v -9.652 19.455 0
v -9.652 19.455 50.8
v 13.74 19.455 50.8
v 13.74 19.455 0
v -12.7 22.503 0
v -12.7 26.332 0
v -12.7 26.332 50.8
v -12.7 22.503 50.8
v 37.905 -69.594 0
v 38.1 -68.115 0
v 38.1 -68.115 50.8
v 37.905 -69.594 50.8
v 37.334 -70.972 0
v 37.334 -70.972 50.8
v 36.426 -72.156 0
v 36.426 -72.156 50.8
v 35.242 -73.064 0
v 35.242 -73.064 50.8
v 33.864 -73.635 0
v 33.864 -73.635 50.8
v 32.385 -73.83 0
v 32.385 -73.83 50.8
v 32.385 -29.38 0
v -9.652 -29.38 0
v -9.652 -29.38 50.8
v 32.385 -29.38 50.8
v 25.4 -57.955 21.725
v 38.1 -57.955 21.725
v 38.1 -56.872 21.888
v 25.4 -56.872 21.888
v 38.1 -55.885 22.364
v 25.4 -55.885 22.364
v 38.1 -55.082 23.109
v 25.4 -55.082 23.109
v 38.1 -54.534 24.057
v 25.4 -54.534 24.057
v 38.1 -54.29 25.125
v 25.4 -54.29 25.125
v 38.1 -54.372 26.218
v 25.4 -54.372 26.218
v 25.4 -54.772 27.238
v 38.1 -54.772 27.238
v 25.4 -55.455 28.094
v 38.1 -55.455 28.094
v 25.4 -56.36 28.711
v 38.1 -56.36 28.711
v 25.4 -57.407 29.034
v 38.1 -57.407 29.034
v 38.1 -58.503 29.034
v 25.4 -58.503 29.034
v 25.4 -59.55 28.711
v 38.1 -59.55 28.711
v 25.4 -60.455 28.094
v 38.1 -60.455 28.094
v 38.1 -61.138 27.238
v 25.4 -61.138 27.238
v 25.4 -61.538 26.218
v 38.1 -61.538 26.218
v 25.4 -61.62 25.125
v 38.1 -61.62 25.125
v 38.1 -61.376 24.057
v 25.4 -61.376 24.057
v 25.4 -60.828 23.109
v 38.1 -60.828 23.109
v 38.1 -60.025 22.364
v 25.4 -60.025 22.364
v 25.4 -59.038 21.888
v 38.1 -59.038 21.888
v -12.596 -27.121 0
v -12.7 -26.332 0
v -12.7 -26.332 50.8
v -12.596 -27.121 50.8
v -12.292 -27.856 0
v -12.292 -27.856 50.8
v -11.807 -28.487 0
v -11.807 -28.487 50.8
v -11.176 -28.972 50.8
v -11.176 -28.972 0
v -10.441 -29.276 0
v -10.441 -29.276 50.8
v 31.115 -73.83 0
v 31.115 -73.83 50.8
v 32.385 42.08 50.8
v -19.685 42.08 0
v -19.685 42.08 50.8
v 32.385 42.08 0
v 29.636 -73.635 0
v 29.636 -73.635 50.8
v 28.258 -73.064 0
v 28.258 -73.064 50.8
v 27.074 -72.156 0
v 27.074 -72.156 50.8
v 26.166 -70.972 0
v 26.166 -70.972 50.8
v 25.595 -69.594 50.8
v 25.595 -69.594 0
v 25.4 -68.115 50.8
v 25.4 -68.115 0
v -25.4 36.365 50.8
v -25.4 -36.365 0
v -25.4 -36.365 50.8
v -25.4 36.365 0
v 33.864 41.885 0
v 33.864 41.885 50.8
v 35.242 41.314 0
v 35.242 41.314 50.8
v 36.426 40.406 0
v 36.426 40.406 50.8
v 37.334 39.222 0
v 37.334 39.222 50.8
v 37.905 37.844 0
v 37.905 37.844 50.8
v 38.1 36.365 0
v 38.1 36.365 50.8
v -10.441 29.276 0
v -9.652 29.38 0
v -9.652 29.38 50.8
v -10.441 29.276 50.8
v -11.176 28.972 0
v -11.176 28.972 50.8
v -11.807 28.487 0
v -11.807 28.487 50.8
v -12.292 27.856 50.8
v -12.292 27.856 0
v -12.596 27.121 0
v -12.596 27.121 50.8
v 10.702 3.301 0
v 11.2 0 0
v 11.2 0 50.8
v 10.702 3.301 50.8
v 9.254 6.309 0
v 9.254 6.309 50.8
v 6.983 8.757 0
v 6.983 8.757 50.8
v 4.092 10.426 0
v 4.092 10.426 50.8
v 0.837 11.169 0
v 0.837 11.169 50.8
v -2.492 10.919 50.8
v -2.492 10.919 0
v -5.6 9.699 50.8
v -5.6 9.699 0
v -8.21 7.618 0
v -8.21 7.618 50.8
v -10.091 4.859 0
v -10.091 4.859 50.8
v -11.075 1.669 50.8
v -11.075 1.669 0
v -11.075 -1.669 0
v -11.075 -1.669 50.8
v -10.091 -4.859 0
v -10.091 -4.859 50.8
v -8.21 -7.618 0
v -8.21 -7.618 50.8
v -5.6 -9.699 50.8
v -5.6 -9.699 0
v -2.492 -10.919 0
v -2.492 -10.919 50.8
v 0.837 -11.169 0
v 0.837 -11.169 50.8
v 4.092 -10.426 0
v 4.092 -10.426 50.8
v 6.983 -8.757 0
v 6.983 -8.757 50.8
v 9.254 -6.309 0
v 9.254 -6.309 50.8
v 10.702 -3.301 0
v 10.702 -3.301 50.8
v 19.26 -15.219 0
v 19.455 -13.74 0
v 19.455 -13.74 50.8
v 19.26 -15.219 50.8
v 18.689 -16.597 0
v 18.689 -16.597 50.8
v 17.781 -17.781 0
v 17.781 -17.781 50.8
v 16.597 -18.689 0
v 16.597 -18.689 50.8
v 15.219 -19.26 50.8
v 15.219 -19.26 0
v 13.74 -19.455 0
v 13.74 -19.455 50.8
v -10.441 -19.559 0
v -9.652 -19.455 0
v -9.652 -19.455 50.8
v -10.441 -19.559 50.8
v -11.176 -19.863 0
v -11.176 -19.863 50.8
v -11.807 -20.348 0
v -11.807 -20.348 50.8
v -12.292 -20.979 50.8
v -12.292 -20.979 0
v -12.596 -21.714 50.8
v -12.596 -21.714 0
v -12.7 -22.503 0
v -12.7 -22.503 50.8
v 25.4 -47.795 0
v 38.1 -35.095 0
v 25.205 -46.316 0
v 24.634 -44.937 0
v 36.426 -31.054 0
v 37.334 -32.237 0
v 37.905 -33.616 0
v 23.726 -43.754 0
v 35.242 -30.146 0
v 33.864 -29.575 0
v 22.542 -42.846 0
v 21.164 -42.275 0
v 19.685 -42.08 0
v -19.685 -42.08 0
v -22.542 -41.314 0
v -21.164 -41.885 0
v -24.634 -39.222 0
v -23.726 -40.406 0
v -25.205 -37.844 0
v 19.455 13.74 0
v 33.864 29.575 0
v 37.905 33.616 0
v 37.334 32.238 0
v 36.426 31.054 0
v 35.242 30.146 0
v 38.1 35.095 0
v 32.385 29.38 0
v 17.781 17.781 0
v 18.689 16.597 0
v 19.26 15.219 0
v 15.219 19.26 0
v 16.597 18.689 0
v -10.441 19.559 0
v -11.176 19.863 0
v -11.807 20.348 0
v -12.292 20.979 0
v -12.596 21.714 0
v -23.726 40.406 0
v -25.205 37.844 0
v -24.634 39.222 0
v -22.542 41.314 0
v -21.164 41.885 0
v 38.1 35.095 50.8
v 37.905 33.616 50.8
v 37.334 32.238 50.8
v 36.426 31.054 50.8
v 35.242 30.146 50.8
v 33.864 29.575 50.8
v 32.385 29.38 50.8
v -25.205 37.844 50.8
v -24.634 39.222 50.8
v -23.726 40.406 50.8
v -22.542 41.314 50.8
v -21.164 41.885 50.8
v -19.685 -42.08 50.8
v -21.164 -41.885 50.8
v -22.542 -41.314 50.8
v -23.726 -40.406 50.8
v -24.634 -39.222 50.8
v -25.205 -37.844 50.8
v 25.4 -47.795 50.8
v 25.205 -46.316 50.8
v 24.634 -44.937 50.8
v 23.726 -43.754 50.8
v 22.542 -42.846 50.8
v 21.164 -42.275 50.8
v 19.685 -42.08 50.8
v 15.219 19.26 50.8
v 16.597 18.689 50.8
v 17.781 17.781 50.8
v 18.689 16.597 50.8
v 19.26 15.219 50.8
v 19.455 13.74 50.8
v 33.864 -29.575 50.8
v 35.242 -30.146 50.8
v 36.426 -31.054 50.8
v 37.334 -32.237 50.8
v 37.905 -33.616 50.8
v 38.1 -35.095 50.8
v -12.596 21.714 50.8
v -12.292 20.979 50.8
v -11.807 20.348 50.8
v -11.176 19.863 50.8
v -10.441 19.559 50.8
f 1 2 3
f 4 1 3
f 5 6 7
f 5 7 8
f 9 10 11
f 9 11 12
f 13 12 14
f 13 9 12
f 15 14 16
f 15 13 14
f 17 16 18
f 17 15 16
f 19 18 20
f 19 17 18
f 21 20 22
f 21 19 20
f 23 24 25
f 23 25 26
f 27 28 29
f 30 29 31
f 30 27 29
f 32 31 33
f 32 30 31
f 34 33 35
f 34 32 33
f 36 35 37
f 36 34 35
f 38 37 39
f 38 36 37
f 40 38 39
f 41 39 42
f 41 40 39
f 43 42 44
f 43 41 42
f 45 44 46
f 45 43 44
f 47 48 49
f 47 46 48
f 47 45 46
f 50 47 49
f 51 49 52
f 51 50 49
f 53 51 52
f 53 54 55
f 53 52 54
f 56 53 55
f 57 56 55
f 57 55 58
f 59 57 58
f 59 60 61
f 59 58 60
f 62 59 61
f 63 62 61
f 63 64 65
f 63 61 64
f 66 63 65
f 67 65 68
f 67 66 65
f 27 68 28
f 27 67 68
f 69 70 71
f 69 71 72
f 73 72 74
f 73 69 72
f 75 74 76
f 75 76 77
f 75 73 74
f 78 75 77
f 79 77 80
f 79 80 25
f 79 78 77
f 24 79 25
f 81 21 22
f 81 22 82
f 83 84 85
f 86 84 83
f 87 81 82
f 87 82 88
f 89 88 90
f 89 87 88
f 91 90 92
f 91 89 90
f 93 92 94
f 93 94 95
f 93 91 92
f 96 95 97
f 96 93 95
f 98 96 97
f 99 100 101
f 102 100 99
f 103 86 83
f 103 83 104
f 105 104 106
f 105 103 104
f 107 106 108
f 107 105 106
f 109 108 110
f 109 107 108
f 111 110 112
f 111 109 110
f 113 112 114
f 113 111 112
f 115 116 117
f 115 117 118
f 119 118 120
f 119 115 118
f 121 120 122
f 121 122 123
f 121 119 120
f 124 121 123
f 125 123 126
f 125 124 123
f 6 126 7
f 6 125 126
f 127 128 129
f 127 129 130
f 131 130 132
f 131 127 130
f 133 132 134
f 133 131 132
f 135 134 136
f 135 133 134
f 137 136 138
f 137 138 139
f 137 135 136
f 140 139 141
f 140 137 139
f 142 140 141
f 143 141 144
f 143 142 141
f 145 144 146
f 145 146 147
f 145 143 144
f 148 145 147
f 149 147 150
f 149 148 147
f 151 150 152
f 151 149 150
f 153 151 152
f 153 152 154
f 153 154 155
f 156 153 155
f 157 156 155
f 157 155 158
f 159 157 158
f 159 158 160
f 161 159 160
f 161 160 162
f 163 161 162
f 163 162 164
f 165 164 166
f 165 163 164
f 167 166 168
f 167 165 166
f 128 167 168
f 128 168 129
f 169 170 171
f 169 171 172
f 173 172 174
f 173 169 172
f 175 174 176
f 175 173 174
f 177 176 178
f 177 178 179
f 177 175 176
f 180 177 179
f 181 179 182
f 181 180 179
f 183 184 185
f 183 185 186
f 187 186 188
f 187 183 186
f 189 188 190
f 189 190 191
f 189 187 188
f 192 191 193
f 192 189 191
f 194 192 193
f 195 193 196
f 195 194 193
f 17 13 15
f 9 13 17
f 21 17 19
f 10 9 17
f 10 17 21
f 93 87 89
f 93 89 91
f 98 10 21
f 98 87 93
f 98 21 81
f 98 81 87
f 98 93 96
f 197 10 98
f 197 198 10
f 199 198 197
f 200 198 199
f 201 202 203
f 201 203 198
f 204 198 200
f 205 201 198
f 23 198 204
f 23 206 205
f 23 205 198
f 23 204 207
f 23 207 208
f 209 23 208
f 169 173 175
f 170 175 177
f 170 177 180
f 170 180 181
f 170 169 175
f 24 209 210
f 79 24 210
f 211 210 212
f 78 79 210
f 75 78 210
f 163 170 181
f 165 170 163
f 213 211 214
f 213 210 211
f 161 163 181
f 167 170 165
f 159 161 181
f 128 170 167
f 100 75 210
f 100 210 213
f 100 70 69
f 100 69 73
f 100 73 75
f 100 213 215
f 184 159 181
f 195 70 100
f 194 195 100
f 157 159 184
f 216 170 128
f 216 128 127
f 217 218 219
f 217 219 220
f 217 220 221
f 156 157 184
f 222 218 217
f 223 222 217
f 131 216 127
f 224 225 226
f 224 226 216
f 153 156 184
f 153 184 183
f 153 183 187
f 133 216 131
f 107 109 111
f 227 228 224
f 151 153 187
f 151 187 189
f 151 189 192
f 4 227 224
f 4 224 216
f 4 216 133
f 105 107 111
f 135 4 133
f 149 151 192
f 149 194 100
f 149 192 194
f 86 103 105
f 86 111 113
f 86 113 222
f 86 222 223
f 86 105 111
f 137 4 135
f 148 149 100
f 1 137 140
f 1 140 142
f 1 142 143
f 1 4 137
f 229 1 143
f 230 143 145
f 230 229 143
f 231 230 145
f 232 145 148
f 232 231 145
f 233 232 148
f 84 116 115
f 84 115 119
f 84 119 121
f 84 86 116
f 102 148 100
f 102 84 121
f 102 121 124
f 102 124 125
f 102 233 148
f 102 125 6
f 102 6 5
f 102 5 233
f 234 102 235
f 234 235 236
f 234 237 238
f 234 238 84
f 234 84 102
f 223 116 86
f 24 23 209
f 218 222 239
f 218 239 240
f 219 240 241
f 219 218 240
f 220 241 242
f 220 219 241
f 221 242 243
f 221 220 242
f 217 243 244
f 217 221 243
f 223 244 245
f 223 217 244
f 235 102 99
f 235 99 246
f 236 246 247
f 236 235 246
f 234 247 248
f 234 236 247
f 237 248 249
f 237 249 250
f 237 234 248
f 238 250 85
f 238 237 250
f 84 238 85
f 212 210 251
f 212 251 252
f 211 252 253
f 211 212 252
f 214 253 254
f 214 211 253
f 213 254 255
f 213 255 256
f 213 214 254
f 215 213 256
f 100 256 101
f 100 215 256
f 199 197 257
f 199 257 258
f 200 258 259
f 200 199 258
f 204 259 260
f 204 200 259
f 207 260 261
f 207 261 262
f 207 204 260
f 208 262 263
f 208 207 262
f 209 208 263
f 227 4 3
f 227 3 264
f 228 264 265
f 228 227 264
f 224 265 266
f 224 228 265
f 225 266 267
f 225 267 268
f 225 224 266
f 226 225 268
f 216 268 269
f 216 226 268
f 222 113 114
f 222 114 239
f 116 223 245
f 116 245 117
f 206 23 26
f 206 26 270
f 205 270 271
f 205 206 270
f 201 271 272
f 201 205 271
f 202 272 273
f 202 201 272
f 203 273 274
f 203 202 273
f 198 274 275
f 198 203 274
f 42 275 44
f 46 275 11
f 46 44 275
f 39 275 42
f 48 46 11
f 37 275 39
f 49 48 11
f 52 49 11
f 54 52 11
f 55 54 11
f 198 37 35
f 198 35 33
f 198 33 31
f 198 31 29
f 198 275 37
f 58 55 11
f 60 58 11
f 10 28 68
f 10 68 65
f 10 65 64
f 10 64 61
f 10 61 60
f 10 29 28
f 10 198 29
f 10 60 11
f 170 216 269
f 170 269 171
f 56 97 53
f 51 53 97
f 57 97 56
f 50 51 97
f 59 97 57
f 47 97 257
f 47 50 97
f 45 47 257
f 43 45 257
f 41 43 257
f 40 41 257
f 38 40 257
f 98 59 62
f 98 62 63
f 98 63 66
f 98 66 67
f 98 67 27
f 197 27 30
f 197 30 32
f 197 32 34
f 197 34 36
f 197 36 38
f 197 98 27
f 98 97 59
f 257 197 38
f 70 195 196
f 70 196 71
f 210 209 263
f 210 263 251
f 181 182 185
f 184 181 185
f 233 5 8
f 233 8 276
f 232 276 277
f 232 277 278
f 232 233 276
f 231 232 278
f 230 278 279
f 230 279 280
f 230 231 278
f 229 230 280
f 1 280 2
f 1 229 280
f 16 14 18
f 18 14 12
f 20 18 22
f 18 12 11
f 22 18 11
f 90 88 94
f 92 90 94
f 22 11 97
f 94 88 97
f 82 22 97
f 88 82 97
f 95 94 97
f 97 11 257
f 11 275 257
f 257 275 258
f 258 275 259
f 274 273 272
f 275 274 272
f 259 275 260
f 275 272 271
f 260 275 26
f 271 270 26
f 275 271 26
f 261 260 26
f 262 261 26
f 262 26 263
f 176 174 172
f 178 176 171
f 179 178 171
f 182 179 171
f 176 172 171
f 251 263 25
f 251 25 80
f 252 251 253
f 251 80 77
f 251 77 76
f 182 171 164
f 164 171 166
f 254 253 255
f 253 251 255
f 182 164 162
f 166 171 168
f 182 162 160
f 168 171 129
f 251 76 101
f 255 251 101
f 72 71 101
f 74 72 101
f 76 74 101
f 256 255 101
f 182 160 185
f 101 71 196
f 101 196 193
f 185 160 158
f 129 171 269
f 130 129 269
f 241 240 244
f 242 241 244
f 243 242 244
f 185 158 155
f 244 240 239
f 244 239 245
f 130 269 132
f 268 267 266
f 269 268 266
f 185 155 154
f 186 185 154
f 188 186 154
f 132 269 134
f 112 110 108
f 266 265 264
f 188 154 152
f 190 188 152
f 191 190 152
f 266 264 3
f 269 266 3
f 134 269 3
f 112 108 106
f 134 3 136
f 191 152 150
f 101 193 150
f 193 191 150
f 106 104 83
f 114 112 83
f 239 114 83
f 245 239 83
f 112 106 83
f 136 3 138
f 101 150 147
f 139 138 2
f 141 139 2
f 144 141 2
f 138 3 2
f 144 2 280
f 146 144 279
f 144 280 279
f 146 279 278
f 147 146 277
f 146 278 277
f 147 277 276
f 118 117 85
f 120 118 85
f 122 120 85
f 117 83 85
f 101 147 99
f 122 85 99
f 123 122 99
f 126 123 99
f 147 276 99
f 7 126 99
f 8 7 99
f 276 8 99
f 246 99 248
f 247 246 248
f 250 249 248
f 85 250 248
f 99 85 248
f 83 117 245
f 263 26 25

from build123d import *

# Parameters (mm, degrees)
SKETCH1_R           = 11.2
BOSS_EXTRUDE1_DEPTH = 50.8
SKETCH2_R           = 3.675
CUT_EXTRUDE1_DEPTH  = 50.8


with BuildPart() as part:
    # Sketch1 → Boss-Extrude1 (new body)
    with BuildSketch(Plane.XY):
        with BuildLine():
            Line((-25.4, -36.364999962), (-25.4, 36.365))
            ThreePointArc((-25.4, 36.365), (-23.726115254, 40.406115254), (-19.685, 42.08))
            Line((-19.685, 42.08), (32.385, 42.08))
            ThreePointArc((32.385, 42.08), (36.426115254, 40.406115254), (38.1, 36.365))
            Line((38.1, 36.365), (38.1, 35.095))
            ThreePointArc((38.1, 35.095), (36.426115254, 31.053884746), (32.385, 29.38))
            Line((32.385, 29.38), (-9.652, 29.38))
            ThreePointArc((-9.652, 29.38), (-11.807261469, 28.487261469), (-12.7, 26.332))
            Line((-12.7, 26.332), (-12.7, 22.503))
            ThreePointArc((-12.7, 22.503), (-11.807261469, 20.347738531), (-9.652, 19.455))
            Line((-9.652, 19.455), (0, 19.455))
            Line((0, 19.455), (13.74, 19.455))
            ThreePointArc((13.74, 19.455), (17.781115254, 17.781115254), (19.455, 13.74))
            Line((19.455, 13.74), (19.455, 0))
            Line((19.455, 0), (19.455, -13.74))
            ThreePointArc((19.455, -13.74), (17.781115254, -17.781115254), (13.74, -19.455))
            Line((13.74, -19.455), (0, -19.455))
            Line((0, -19.455), (-9.652, -19.455))
            ThreePointArc((-9.652, -19.455), (-11.807261469, -20.347738531), (-12.7, -22.503))
            Line((-12.7, -22.503), (-12.7, -26.331999962))
            ThreePointArc((-12.7, -26.331999962), (-11.807261469, -28.487261431), (-9.652, -29.379999962))
            Line((-9.652, -29.379999962), (32.385, -29.379999962))
            ThreePointArc((32.385, -29.379999962), (36.426115254, -31.053884708), (38.1, -35.094999962))
            Line((38.1, -35.094999962), (38.1, -68.114999962))
            ThreePointArc((38.1, -68.114999962), (36.426115254, -72.156115216), (32.385, -73.829999962))
            Line((32.385, -73.829999962), (31.115, -73.829999962))
            ThreePointArc((31.115, -73.829999962), (27.073884746, -72.156115216), (25.4, -68.114999962))
            Line((25.4, -68.114999962), (25.4, -47.794999962))
            ThreePointArc((25.4, -47.794999962), (23.726115254, -43.753884708), (19.685, -42.079999962))
            Line((19.685, -42.079999962), (-19.685, -42.079999962))
            ThreePointArc((-19.685, -42.079999962), (-23.726115254, -40.406115216), (-25.4, -36.364999962))
        make_face()
        Circle(SKETCH1_R, mode=Mode.SUBTRACT)
    extrude(amount=BOSS_EXTRUDE1_DEPTH)

    # Sketch2 → Cut-Extrude1 (cut)
    with BuildSketch(Plane(origin=(25.4, 0, 0), x_dir=(0, 0, -1), z_dir=(1, 0, 0))):
        with Locations((-25.4, -57.954999962)):
            Circle(SKETCH2_R)
    extrude(amount=CUT_EXTRUDE1_DEPTH, mode=Mode.SUBTRACT)


solid = part.part
